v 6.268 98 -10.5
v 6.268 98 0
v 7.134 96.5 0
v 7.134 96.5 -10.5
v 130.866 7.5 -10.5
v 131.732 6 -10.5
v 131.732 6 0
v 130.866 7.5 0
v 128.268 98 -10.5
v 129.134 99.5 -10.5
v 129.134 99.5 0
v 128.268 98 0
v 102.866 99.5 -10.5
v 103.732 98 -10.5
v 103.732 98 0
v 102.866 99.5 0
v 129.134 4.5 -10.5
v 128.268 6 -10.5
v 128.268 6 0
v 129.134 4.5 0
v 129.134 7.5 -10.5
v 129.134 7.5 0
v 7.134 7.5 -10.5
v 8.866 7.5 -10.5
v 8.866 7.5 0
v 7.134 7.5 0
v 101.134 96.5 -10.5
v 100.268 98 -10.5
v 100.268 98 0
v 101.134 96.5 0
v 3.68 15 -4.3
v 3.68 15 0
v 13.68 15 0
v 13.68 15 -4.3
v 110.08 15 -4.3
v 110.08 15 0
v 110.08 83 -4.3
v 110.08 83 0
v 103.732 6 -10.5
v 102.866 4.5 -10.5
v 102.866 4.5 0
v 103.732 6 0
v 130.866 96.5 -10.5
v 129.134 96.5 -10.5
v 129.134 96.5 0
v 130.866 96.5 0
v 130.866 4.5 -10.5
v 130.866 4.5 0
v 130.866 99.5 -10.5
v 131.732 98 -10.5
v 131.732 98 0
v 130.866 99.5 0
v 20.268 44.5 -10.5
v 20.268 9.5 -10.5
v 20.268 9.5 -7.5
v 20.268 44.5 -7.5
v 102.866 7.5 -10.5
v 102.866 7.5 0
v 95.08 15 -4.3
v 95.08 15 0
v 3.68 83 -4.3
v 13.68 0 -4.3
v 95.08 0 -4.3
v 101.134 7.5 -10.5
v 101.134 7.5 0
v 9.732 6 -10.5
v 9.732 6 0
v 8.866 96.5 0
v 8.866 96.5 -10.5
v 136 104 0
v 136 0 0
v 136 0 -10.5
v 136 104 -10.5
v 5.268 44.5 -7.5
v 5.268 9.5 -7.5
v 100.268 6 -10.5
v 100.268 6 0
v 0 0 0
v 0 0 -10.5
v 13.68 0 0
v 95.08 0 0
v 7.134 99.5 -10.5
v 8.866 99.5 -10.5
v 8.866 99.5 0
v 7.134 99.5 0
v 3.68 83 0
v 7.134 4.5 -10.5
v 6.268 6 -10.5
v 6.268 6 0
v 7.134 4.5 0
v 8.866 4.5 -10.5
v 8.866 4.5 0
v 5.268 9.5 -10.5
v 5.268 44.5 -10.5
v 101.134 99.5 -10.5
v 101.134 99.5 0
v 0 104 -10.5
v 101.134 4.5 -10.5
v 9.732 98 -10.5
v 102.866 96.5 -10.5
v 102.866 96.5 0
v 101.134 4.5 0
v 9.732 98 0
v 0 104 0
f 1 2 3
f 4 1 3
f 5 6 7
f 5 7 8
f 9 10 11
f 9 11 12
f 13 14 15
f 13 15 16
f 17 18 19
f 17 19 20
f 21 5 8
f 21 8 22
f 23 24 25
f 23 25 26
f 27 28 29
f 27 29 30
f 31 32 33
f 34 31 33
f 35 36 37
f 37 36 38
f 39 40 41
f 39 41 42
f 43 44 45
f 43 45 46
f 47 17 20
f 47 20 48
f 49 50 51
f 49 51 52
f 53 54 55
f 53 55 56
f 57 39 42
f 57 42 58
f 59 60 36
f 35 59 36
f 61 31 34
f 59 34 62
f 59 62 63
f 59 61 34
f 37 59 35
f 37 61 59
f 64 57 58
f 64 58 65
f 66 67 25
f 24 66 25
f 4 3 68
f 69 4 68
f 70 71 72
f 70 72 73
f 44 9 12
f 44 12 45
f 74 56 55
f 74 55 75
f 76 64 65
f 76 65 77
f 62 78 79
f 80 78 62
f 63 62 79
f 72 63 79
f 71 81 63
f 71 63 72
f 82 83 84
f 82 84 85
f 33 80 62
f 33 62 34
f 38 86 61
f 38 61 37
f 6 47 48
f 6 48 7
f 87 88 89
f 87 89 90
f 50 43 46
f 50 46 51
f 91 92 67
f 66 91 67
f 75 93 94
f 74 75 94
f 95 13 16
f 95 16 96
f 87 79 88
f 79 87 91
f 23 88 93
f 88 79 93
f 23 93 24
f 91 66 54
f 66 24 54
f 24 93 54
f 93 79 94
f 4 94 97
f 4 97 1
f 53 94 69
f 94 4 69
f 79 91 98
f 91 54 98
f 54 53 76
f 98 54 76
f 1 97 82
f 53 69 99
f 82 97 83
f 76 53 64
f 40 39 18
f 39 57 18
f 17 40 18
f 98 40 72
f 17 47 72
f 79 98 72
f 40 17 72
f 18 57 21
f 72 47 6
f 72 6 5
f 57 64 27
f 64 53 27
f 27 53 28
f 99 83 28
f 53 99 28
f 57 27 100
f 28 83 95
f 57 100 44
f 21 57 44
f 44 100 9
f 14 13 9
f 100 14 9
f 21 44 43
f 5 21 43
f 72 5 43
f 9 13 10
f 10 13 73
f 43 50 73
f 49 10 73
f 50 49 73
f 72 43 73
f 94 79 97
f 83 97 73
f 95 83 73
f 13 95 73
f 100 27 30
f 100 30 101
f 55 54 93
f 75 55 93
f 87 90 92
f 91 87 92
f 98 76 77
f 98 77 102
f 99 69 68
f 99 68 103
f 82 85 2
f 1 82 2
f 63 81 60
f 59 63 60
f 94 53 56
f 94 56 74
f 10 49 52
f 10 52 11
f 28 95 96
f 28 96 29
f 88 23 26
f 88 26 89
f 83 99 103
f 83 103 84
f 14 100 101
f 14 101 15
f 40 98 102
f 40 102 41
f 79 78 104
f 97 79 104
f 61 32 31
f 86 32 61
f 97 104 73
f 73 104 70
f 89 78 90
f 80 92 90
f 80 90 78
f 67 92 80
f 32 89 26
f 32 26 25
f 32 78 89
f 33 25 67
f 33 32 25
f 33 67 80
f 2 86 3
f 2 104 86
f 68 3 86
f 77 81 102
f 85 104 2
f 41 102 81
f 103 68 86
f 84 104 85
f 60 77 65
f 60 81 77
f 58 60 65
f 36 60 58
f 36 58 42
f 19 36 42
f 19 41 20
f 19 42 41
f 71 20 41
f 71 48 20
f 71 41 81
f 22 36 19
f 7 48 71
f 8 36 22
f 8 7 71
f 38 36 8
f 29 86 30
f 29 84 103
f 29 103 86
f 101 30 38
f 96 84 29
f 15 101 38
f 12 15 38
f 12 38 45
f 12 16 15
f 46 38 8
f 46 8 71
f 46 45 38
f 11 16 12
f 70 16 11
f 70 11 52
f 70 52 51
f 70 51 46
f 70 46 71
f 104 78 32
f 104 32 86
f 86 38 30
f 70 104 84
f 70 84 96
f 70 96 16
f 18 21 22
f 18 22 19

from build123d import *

# Parameters (mm, degrees)
SKETCH_1_W             = 136
SKETCH_1_H             = 104
EXTRUDE_1_DEPTH        = 10.5
CUT_EXTRUDE_1428_DEPTH = 4.3
CUT_EXTRUDE_1765_REACH = 173.529
SKETCH_4_W             = 15
SKETCH_4_H             = 35
CUT_EXTRUDE_3_DEPTH    = 3


with BuildPart() as part:
    # 草图1 → 凸台-拉伸1 (new body)
    with BuildSketch(Plane.XY):
        with Locations((68, 52)):
            Rectangle(SKETCH_1_W, SKETCH_1_H)
    extrude(amount=-EXTRUDE_1_DEPTH)

    # 草图1<3> → Cut-Extrude 1428 (cut)
    with BuildSketch(Plane.XY):
        Polygon((13.68, 15), (13.68, 0), (95.08, 0), (95.08, 15), (110.08, 15), (110.08, 83), (3.68, 83), (3.68, 15), align=None)
    extrude(amount=-CUT_EXTRUDE_1428_DEPTH, mode=Mode.SUBTRACT)

    # 草图1<5> → Cut-Extrude 1765 (cut, up to next)
    with BuildSketch(Plane.XY, mode=Mode.PRIVATE) as cut_extrude_1765_sk1:
        Polygon((8.866025404, 4.5), (9.732050808, 6), (8.866025404, 7.5), (7.133974596, 7.5), (6.267949192, 6), (7.133974596, 4.5), align=None)
    cut_extrude_1765_tool1 = extrude(cut_extrude_1765_sk1.sketch, amount=-CUT_EXTRUDE_1765_REACH, mode=Mode.PRIVATE) & part.part
    # 草图1<5> → Cut-Extrude 1765 (cut, up to next)
    with BuildSketch(Plane.XY, mode=Mode.PRIVATE) as cut_extrude_1765_sk2:
        Polygon((129.133974596, 7.5), (128.267949192, 6), (129.133974596, 4.5), (130.866025404, 4.5), (131.732050808, 6), (130.866025404, 7.5), align=None)
    cut_extrude_1765_tool2 = extrude(cut_extrude_1765_sk2.sketch, amount=-CUT_EXTRUDE_1765_REACH, mode=Mode.PRIVATE) & part.part
    # 草图1<5> → Cut-Extrude 1765 (cut, up to next)
    with BuildSketch(Plane.XY, mode=Mode.PRIVATE) as cut_extrude_1765_sk3:
        Polygon((130.866025404, 96.5), (131.732050808, 98), (130.866025404, 99.5), (129.133974596, 99.5), (128.267949192, 98), (129.133974596, 96.5), align=None)
    cut_extrude_1765_tool3 = extrude(cut_extrude_1765_sk3.sketch, amount=-CUT_EXTRUDE_1765_REACH, mode=Mode.PRIVATE) & part.part
    # 草图1<5> → Cut-Extrude 1765 (cut, up to next)
    with BuildSketch(Plane.XY, mode=Mode.PRIVATE) as cut_extrude_1765_sk4:
        Polygon((8.866025404, 96.5), (9.732050808, 98), (8.866025404, 99.5), (7.133974596, 99.5), (6.267949192, 98), (7.133974596, 96.5), align=None)
    cut_extrude_1765_tool4 = extrude(cut_extrude_1765_sk4.sketch, amount=-CUT_EXTRUDE_1765_REACH, mode=Mode.PRIVATE) & part.part
    # 草图1<5> → Cut-Extrude 1765 (cut, up to next)
    with BuildSketch(Plane.XY, mode=Mode.PRIVATE) as cut_extrude_1765_sk5:
        Polygon((102.866025404, 99.5), (101.133974596, 99.5), (100.267949192, 98), (101.133974596, 96.5), (102.866025404, 96.5), (103.732050808, 98), align=None)
    cut_extrude_1765_tool5 = extrude(cut_extrude_1765_sk5.sketch, amount=-CUT_EXTRUDE_1765_REACH, mode=Mode.PRIVATE) & part.part
    # 草图1<5> → Cut-Extrude 1765 (cut, up to next)
    with BuildSketch(Plane.XY, mode=Mode.PRIVATE) as cut_extrude_1765_sk6:
        Polygon((102.866025404, 4.5), (103.732050808, 6), (102.866025404, 7.5), (101.133974596, 7.5), (100.267949192, 6), (101.133974596, 4.5), align=None)
    cut_extrude_1765_tool6 = extrude(cut_extrude_1765_sk6.sketch, amount=-CUT_EXTRUDE_1765_REACH, mode=Mode.PRIVATE) & part.part
    add(cut_extrude_1765_tool1.solids().sort_by_distance((8, 6, 0))[0], mode=Mode.SUBTRACT)
    add(cut_extrude_1765_tool2.solids().sort_by_distance((130, 6, 0))[0], mode=Mode.SUBTRACT)
    add(cut_extrude_1765_tool3.solids().sort_by_distance((130, 98, 0))[0], mode=Mode.SUBTRACT)
    add(cut_extrude_1765_tool4.solids().sort_by_distance((8, 98, 0))[0], mode=Mode.SUBTRACT)
    add(cut_extrude_1765_tool5.solids().sort_by_distance((102, 98, 0))[0], mode=Mode.SUBTRACT)
    add(cut_extrude_1765_tool6.solids().sort_by_distance((102, 6, 0))[0], mode=Mode.SUBTRACT)

    # 草图4 → 切除-拉伸3 (cut)
    with BuildSketch(Plane(origin=(0, 0, -10.5), x_dir=(-1, 0, 0), z_dir=(0, 0, -1))):
        with Locations((-12.767949192, 27)):
            Rectangle(SKETCH_4_W, SKETCH_4_H)
    extrude(amount=-CUT_EXTRUDE_3_DEPTH, mode=Mode.SUBTRACT)


solid = part.part
